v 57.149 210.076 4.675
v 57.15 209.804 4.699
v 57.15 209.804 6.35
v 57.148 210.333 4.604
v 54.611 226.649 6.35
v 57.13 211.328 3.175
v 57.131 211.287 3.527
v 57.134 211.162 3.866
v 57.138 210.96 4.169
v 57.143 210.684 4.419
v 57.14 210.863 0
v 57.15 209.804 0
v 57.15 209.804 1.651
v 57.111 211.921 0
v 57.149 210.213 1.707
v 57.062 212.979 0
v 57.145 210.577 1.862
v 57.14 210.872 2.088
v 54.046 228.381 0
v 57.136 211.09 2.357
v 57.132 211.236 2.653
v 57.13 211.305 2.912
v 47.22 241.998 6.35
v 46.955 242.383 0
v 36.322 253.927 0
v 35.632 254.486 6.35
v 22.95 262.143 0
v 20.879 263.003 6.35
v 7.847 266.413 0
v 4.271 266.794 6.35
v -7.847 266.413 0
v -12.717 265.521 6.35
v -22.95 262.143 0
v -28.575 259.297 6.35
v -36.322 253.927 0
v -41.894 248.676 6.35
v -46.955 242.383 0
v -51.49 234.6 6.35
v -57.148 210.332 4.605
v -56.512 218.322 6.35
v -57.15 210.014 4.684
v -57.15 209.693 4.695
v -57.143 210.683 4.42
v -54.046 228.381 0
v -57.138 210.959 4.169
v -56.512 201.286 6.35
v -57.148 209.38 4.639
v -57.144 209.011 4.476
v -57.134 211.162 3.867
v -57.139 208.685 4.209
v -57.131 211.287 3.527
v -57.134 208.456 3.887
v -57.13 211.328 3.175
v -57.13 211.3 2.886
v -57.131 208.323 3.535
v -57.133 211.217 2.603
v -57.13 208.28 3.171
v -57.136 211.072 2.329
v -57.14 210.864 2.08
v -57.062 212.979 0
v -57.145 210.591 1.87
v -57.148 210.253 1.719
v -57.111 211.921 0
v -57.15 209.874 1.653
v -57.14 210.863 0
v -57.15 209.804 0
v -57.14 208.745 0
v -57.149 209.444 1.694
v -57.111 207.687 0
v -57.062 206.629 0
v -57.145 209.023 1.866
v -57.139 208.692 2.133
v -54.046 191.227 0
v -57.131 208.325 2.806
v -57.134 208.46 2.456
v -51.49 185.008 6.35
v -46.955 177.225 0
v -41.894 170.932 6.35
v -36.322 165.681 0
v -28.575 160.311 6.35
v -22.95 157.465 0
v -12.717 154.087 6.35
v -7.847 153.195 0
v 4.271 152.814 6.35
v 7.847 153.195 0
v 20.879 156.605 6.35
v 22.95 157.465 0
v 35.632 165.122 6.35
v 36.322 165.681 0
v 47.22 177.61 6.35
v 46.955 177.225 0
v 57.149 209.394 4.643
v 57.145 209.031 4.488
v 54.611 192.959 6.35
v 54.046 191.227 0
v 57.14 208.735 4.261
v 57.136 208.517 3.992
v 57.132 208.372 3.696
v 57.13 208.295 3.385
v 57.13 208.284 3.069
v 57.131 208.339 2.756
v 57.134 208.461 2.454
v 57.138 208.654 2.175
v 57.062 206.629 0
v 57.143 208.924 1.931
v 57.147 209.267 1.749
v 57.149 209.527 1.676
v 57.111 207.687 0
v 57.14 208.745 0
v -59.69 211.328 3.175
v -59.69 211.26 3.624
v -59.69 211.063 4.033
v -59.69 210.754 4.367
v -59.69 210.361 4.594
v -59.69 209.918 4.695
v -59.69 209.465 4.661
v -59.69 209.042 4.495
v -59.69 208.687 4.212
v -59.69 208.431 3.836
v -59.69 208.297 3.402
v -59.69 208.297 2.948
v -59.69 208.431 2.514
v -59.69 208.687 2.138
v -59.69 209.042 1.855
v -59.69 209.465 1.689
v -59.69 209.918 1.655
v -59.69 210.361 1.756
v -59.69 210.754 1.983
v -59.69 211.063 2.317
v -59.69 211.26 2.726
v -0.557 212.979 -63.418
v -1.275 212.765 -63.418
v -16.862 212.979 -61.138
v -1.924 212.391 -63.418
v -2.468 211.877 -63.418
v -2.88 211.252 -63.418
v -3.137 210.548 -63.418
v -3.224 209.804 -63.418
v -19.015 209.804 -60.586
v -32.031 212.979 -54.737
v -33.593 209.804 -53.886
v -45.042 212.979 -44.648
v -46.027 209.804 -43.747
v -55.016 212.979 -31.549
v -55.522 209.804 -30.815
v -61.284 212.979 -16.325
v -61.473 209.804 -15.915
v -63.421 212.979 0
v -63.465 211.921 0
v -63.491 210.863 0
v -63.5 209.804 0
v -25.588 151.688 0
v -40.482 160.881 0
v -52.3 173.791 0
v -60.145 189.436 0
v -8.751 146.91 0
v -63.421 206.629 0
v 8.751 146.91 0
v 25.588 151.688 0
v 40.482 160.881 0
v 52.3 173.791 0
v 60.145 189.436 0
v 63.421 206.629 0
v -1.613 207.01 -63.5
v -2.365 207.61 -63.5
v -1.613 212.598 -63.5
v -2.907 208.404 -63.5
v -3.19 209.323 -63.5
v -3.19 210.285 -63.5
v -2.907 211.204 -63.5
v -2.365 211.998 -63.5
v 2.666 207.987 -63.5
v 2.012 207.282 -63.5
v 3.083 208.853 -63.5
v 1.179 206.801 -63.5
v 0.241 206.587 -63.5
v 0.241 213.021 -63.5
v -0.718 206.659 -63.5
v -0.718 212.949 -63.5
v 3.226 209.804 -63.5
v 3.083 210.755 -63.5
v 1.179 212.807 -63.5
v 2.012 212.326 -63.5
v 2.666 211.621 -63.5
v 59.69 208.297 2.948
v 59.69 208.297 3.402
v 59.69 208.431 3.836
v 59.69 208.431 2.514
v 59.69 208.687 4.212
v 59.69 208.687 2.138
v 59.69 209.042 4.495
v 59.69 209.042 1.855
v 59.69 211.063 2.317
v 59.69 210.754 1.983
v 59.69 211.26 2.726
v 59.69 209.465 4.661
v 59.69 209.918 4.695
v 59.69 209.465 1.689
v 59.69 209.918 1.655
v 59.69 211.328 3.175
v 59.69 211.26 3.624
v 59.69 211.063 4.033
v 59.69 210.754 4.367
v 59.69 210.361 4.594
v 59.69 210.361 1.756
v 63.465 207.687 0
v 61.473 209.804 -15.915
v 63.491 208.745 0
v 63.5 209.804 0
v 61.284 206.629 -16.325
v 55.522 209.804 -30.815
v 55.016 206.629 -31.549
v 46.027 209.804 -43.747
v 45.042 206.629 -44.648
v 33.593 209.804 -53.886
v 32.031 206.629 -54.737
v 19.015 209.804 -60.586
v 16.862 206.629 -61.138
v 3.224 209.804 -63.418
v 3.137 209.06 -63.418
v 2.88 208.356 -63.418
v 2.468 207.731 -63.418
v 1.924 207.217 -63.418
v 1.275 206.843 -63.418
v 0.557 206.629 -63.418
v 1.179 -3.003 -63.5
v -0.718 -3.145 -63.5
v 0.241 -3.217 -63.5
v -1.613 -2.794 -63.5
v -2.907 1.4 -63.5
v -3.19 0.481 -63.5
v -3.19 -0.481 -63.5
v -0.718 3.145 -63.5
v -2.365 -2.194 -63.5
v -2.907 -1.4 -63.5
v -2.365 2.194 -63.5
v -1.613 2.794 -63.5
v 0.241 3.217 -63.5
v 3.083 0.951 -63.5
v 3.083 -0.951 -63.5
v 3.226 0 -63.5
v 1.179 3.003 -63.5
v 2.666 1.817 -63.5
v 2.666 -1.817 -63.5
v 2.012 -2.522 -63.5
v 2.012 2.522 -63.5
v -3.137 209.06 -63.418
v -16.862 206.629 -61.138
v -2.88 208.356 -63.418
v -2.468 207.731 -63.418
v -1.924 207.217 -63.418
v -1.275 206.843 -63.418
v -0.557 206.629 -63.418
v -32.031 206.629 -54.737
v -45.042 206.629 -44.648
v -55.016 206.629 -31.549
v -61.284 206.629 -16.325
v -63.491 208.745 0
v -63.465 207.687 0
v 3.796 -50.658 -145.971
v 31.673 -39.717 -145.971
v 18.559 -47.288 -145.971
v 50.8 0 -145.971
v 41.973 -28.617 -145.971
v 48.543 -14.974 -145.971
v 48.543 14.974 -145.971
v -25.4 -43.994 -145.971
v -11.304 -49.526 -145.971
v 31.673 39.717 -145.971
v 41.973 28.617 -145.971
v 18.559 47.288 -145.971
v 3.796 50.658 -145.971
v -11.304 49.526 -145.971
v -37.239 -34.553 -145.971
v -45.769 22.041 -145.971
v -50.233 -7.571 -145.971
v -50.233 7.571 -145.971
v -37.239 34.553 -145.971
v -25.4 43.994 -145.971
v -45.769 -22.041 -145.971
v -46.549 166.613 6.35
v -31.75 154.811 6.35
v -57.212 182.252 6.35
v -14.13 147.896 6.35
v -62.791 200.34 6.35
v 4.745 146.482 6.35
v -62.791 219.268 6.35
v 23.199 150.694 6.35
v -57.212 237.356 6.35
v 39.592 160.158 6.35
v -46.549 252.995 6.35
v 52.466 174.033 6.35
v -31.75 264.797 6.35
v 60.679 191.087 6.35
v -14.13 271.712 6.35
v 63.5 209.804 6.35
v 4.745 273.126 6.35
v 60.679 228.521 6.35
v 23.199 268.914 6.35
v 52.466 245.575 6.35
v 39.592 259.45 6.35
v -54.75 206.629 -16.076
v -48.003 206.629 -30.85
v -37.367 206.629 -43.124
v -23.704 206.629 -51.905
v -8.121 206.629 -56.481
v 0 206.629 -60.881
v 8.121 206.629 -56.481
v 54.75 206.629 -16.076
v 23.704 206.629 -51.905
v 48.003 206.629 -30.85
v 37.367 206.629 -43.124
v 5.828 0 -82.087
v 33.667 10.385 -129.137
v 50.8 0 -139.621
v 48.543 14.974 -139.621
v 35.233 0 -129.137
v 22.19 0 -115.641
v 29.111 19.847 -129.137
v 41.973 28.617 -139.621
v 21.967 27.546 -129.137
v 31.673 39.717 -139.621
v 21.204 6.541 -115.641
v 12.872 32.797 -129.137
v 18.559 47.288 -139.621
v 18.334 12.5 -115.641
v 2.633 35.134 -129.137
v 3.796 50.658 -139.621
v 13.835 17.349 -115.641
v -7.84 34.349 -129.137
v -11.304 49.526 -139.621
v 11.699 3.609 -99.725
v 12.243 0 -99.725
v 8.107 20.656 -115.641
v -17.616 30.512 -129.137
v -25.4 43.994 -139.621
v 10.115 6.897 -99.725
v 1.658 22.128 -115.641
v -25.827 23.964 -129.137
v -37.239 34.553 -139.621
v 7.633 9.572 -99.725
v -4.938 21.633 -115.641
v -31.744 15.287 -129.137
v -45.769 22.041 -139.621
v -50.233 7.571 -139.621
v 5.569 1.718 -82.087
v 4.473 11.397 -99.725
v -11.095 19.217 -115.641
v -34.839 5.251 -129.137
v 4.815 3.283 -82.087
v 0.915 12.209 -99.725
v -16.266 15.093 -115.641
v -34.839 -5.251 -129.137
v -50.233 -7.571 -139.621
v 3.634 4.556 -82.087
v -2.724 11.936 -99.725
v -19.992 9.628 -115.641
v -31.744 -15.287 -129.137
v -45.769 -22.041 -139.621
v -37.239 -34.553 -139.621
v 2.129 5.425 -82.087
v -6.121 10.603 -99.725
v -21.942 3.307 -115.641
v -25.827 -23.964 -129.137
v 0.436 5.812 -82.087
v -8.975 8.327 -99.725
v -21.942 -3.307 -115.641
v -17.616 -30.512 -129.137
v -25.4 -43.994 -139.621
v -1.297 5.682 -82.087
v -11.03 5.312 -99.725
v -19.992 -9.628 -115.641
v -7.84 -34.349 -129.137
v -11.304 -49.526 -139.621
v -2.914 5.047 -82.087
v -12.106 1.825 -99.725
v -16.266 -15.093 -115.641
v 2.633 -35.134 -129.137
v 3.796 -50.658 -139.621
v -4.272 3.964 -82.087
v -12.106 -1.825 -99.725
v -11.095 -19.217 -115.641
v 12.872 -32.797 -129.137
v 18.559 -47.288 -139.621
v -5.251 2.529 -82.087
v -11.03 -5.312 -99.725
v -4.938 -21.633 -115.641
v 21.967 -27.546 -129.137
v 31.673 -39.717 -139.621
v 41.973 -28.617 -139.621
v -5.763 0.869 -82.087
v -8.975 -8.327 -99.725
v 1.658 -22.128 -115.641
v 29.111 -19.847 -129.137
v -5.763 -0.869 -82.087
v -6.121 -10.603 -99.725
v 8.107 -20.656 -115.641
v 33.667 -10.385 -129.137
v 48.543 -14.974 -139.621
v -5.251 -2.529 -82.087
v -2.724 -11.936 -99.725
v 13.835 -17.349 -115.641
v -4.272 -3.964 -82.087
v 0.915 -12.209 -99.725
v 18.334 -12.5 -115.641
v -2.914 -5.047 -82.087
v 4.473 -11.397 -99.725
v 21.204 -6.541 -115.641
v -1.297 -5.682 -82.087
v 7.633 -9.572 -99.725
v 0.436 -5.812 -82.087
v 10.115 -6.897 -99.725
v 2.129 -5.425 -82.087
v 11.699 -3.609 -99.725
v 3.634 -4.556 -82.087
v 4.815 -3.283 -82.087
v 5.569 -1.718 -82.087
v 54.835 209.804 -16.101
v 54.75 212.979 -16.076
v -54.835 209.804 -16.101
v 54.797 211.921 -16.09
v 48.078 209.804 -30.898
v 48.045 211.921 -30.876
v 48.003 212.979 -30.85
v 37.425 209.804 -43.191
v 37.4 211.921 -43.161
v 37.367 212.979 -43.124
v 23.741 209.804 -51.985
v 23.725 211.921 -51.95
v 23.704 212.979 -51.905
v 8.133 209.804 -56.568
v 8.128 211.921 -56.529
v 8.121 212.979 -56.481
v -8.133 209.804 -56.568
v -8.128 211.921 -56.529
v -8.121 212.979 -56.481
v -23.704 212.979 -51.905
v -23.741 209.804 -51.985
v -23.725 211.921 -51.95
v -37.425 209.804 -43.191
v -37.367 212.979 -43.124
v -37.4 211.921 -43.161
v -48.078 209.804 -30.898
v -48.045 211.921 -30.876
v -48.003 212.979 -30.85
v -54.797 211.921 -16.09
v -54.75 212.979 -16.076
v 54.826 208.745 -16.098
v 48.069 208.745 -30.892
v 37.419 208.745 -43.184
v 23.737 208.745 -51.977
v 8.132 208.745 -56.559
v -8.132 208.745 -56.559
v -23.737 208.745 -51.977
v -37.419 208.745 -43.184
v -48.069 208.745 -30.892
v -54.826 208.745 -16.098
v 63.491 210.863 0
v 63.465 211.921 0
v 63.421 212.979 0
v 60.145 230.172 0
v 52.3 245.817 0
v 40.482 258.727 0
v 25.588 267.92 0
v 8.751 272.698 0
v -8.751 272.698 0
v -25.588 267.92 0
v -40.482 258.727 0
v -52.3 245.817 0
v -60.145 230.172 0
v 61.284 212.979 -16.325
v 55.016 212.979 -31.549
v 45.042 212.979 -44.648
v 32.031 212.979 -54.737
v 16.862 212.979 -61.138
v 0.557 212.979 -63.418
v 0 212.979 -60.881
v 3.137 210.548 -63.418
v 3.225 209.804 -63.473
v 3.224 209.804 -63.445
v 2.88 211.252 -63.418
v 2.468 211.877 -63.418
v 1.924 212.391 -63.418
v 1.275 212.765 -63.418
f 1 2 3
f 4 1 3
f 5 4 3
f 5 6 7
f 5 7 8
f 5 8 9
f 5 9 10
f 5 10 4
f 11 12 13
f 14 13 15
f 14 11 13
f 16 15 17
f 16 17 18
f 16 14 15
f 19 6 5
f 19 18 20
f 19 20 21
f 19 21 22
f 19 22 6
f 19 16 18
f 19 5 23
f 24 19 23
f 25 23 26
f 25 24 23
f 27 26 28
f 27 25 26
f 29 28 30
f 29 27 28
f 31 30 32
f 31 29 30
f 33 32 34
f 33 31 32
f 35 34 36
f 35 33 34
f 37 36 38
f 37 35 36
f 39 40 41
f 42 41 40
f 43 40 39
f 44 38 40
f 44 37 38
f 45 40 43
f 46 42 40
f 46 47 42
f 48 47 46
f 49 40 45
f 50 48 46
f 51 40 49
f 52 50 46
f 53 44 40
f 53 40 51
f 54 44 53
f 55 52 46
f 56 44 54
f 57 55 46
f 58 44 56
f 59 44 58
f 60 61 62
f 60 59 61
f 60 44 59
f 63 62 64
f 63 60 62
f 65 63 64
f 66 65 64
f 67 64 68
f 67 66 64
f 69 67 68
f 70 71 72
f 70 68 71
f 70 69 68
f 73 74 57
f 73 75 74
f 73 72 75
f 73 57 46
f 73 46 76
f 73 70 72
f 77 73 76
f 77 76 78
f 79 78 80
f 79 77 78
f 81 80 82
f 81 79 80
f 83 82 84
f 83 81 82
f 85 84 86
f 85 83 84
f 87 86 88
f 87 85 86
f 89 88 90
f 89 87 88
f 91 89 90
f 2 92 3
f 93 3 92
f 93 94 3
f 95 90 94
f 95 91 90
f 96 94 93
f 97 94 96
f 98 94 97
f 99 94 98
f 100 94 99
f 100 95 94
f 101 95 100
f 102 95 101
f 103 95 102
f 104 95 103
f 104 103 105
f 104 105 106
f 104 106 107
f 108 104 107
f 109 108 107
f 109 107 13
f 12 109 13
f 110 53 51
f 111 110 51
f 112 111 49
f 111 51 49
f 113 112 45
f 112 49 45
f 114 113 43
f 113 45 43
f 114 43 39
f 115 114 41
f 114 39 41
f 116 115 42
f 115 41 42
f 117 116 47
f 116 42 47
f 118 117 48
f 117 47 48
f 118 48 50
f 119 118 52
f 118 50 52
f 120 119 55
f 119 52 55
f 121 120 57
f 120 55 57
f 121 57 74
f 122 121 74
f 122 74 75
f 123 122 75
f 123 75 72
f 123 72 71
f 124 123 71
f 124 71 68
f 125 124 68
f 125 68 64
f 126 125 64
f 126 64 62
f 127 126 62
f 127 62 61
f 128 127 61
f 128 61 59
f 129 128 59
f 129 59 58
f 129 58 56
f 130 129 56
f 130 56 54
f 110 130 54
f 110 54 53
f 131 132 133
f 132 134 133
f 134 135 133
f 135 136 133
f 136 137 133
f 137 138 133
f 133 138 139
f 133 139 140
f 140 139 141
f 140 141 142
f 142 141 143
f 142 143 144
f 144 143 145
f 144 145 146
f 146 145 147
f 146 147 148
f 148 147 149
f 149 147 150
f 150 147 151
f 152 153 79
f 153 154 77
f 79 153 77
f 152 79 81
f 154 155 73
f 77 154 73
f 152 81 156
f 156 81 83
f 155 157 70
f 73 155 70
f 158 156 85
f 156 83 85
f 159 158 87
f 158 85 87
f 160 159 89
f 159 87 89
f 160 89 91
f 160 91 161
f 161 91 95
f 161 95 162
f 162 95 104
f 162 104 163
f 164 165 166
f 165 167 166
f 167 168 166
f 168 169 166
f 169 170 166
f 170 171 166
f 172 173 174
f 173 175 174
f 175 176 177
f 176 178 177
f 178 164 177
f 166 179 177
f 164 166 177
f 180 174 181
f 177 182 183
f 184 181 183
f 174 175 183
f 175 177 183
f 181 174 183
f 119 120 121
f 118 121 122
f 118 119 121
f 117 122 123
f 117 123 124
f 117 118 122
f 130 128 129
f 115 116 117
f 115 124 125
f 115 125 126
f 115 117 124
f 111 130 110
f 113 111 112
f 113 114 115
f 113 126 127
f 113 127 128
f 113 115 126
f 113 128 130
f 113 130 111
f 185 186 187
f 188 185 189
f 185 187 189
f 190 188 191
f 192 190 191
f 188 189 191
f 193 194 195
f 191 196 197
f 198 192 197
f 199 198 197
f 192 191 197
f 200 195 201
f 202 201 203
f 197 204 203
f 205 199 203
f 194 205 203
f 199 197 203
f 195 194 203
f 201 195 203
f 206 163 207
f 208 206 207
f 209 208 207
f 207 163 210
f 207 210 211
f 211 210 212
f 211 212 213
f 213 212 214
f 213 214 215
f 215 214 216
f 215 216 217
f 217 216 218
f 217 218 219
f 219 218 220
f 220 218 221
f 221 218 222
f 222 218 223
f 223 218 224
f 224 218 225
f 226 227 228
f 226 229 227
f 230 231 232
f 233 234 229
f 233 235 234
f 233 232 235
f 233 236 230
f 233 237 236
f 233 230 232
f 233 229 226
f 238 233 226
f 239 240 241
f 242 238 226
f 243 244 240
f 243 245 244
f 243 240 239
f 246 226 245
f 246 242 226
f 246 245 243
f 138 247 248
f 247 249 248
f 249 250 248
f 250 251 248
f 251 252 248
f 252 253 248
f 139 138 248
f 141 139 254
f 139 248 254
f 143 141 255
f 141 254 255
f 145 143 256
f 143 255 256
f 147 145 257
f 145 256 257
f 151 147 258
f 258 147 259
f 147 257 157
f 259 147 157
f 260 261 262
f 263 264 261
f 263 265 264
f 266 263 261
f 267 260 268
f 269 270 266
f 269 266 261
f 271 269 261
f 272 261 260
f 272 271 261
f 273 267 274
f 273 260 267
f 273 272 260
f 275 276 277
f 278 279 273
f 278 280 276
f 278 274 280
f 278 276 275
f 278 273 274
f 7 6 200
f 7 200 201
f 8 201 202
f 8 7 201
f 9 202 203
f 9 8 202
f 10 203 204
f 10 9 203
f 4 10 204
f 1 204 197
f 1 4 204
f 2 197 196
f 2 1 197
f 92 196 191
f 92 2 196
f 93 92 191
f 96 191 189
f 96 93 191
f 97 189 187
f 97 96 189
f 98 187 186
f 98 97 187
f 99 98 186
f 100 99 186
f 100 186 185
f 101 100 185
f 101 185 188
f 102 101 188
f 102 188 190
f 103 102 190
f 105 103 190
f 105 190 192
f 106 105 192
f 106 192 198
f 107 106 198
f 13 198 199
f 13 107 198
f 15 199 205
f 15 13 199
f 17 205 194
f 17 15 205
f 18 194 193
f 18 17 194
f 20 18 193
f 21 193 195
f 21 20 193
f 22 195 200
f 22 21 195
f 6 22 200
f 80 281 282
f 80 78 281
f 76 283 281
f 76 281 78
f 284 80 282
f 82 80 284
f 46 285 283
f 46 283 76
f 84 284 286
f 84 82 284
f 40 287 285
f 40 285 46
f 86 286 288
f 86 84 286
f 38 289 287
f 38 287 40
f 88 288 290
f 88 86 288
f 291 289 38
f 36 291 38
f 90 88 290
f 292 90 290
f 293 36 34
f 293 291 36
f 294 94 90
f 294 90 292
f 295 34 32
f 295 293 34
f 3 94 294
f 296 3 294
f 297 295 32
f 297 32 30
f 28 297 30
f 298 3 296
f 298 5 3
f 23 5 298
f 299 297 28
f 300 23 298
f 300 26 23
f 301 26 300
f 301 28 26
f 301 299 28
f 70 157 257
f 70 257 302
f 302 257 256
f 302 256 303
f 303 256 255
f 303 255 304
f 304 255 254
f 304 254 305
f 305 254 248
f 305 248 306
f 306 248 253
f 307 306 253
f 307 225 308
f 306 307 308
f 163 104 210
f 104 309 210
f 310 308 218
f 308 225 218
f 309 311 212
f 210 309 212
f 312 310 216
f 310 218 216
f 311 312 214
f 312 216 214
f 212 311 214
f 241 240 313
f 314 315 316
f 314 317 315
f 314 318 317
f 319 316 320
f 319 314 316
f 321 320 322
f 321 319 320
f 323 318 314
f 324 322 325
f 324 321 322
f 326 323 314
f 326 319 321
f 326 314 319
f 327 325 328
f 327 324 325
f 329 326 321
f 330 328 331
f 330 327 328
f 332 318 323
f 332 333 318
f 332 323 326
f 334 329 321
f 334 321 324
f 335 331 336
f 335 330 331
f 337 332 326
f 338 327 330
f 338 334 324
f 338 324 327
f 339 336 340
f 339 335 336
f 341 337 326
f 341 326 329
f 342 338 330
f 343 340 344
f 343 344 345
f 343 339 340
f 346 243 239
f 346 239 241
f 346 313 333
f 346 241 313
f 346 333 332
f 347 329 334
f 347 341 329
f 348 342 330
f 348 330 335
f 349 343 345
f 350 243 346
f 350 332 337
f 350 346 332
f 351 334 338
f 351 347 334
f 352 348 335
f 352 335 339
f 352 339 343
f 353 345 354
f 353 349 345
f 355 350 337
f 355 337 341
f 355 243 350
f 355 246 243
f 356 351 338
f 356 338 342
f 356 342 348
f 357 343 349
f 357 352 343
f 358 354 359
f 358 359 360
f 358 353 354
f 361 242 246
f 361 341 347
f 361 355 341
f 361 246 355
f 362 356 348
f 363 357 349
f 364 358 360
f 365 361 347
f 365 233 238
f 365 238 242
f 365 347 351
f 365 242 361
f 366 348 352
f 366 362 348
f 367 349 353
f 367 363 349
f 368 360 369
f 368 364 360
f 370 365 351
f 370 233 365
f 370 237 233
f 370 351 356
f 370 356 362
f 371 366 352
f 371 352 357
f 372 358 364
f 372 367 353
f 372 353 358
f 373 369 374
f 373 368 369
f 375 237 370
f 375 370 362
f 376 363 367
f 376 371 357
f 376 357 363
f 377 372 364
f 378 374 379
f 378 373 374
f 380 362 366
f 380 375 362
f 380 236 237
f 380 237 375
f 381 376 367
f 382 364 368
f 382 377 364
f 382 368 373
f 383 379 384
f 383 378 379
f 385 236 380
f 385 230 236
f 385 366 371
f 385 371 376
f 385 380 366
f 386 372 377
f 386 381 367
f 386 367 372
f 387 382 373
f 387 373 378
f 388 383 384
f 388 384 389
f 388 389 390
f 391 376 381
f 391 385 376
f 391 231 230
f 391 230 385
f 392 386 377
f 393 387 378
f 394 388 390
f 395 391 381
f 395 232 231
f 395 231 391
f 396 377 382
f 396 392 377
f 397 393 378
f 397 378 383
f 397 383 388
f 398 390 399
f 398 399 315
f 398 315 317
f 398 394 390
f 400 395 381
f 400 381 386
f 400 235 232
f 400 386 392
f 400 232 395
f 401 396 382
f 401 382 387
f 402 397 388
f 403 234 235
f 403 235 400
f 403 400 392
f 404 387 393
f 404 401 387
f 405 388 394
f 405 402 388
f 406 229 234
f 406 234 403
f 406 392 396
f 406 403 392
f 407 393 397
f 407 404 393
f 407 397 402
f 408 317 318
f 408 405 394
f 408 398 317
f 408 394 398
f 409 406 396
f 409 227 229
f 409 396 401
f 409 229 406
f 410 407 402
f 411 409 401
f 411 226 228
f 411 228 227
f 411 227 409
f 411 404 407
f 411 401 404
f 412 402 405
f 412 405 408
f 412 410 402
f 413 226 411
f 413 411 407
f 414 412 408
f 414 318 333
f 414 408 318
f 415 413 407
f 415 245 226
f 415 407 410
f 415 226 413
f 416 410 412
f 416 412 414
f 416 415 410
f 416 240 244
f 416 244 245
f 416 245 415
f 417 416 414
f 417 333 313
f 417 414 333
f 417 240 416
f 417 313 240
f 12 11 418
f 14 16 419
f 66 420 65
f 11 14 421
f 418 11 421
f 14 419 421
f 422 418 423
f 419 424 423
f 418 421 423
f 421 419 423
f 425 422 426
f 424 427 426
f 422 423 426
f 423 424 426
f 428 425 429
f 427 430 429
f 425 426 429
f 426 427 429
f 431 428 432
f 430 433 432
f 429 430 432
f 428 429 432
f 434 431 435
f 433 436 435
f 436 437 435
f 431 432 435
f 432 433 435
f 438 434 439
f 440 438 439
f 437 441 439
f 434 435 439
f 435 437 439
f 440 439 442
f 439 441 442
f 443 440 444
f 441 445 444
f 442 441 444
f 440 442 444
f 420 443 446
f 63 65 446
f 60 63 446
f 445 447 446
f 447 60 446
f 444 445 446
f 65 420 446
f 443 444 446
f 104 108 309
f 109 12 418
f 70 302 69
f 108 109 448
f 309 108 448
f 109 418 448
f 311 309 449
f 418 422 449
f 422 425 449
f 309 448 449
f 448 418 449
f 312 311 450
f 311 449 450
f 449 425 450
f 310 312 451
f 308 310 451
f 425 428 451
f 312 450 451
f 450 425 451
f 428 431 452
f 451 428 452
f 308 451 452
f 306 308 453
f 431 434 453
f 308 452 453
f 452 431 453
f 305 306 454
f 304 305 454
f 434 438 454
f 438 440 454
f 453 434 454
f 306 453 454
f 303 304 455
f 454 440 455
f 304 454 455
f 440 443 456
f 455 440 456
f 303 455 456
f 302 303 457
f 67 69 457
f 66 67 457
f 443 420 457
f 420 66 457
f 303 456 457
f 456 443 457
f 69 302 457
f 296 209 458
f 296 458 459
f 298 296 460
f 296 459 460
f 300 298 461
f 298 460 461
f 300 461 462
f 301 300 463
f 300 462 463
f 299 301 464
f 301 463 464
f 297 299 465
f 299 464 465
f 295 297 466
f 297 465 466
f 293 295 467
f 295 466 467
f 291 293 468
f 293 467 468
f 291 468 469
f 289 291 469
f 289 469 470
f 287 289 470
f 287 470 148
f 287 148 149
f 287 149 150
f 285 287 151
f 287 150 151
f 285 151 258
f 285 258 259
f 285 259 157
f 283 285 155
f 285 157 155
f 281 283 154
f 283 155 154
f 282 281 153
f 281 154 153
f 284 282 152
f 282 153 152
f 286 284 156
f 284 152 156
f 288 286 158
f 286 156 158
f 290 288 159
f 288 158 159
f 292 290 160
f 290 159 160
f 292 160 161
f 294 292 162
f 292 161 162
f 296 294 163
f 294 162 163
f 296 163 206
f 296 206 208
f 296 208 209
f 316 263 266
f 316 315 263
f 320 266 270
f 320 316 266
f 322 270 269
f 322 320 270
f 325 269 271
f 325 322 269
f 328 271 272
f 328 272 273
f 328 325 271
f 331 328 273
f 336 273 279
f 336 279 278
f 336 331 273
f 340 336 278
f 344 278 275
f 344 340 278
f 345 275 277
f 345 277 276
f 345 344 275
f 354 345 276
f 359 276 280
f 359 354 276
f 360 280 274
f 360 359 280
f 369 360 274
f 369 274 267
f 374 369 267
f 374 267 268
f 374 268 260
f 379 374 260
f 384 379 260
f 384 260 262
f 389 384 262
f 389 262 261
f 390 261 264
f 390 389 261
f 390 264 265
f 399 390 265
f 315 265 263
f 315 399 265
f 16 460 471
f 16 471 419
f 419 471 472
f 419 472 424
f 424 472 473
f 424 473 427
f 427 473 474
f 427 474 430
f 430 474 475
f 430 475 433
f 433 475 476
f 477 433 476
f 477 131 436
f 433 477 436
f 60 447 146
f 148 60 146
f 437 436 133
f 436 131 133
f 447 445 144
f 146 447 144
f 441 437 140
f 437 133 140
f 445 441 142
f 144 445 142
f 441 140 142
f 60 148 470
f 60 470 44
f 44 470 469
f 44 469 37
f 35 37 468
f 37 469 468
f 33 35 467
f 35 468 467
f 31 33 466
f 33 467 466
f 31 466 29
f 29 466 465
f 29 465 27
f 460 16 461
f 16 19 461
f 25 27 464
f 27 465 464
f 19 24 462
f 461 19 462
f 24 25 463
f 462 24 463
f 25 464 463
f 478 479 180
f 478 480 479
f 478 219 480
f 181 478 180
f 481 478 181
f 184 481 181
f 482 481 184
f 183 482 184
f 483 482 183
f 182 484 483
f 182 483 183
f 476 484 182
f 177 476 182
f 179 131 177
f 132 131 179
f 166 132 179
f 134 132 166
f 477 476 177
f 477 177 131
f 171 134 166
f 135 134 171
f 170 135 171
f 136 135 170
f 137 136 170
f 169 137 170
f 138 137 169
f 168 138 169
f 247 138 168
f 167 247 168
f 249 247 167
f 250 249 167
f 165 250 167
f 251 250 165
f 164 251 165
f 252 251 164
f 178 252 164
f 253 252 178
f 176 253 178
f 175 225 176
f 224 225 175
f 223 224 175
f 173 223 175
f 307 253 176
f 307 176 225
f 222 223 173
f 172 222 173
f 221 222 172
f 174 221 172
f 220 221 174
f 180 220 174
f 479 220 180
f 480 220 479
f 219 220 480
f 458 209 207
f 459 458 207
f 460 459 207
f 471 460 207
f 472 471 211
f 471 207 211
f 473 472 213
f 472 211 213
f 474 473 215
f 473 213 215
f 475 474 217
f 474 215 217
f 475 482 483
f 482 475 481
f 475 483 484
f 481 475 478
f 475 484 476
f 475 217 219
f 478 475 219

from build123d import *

# Parameters (mm, degrees)
F0_R           = 63.5
F0_R_2         = 57.15
F1_DEPTH       = 6.35
F3_ANGLE       = 180
F6_R           = 1.524
F7_DEPTH       = 59.69
F7_DEPTH_BACK  = 59.69
F9_R           = 79.8874363082
F10_DEPTH      = 63.5
F10_DEPTH_BACK = 6.3510001
F11_R          = 96.9810334846
F12_DEPTH      = 82.4715753285


with BuildPart() as f1:
    # F0 (on Top) → F1 (new body)
    with BuildSketch(Plane.XY):
        Circle(F0_R)
        Circle(F0_R_2, mode=Mode.SUBTRACT)
    extrude(amount=F1_DEPTH)

    # F2 (on face) → F3 (revolve)
    with BuildSketch(Plane(origin=(0, 0, 0), x_dir=(1, 0, 0), z_dir=(0, 0, -1))):
        with BuildLine():
            Line((63.4205753285, 3.175), (57.0617373991, 3.175))
            ThreePointArc((57.0617373991, 3.175), (57.1279300883, 1.5881132899), (57.15, 0))
            ThreePointArc((57.15, 0), (57.1279300883, -1.5881132899), (57.0617373991, -3.175))
            Line((57.0617373991, -3.175), (63.4205753285, -3.175))
            ThreePointArc((63.4205753285, -3.175), (63.4801407267, -1.5879966372), (63.5, 0))
            ThreePointArc((63.5, 0), (63.4801407267, 1.5879966372), (63.4205753285, 3.175))
        make_face()
    revolve(axis=Axis((0, -5.5111055262, 0), (0, 1, 0)), revolution_arc=F3_ANGLE)

    # F4 (on Front) → F5 (revolve)
    with BuildSketch(Plane.XZ):
        with BuildLine():
            ThreePointArc((50.8, -139.6205753285), (16.1124596806, -106.828220683), (3.175, -60.8805753285))
            Line((3.175, -60.8805753285), (0, -60.8805753285))
            Line((0, -60.8805753285), (0, -145.9705753285))
            Line((0, -145.9705753285), (50.8, -145.9705753285))
            Line((50.8, -145.9705753285), (50.8, -139.6205753285))
        make_face()
    revolve(axis=Axis((0, 0, -103.4255753285), (0, 0, 1)))

    # F6 (on Right) → F7 (cut, two sides)
    with BuildSketch(Plane.YZ) as f7_sk:
        with Locations((0, 3.175)):
            Circle(F6_R)
    extrude(amount=-F7_DEPTH, mode=Mode.SUBTRACT)
    extrude(f7_sk.sketch, amount=F7_DEPTH_BACK, mode=Mode.SUBTRACT)


with BuildPart() as f8_1:
    # F8: copy of F1
    add(f1.part.moved(Location((0, 209.804, 0))))

    # F11 (on face) → F12 (cut, through all)
    with BuildSketch(Plane.XY.offset(-63.5)):
        with Locations((0, 208.7470889091)):
            Circle(F11_R)
    extrude(amount=-F12_DEPTH, mode=Mode.SUBTRACT)


with BuildPart() as f1_1:
    add(f1.part)

    # F9 (on Top) → F10 (cut, two sides)
    with BuildSketch(Plane.XY) as f10_sk:
        Circle(F9_R)
    extrude(amount=-F10_DEPTH, mode=Mode.SUBTRACT)
    extrude(f10_sk.sketch, amount=F10_DEPTH_BACK, mode=Mode.SUBTRACT)


solid = Compound([f8_1.part, f1_1.part])
